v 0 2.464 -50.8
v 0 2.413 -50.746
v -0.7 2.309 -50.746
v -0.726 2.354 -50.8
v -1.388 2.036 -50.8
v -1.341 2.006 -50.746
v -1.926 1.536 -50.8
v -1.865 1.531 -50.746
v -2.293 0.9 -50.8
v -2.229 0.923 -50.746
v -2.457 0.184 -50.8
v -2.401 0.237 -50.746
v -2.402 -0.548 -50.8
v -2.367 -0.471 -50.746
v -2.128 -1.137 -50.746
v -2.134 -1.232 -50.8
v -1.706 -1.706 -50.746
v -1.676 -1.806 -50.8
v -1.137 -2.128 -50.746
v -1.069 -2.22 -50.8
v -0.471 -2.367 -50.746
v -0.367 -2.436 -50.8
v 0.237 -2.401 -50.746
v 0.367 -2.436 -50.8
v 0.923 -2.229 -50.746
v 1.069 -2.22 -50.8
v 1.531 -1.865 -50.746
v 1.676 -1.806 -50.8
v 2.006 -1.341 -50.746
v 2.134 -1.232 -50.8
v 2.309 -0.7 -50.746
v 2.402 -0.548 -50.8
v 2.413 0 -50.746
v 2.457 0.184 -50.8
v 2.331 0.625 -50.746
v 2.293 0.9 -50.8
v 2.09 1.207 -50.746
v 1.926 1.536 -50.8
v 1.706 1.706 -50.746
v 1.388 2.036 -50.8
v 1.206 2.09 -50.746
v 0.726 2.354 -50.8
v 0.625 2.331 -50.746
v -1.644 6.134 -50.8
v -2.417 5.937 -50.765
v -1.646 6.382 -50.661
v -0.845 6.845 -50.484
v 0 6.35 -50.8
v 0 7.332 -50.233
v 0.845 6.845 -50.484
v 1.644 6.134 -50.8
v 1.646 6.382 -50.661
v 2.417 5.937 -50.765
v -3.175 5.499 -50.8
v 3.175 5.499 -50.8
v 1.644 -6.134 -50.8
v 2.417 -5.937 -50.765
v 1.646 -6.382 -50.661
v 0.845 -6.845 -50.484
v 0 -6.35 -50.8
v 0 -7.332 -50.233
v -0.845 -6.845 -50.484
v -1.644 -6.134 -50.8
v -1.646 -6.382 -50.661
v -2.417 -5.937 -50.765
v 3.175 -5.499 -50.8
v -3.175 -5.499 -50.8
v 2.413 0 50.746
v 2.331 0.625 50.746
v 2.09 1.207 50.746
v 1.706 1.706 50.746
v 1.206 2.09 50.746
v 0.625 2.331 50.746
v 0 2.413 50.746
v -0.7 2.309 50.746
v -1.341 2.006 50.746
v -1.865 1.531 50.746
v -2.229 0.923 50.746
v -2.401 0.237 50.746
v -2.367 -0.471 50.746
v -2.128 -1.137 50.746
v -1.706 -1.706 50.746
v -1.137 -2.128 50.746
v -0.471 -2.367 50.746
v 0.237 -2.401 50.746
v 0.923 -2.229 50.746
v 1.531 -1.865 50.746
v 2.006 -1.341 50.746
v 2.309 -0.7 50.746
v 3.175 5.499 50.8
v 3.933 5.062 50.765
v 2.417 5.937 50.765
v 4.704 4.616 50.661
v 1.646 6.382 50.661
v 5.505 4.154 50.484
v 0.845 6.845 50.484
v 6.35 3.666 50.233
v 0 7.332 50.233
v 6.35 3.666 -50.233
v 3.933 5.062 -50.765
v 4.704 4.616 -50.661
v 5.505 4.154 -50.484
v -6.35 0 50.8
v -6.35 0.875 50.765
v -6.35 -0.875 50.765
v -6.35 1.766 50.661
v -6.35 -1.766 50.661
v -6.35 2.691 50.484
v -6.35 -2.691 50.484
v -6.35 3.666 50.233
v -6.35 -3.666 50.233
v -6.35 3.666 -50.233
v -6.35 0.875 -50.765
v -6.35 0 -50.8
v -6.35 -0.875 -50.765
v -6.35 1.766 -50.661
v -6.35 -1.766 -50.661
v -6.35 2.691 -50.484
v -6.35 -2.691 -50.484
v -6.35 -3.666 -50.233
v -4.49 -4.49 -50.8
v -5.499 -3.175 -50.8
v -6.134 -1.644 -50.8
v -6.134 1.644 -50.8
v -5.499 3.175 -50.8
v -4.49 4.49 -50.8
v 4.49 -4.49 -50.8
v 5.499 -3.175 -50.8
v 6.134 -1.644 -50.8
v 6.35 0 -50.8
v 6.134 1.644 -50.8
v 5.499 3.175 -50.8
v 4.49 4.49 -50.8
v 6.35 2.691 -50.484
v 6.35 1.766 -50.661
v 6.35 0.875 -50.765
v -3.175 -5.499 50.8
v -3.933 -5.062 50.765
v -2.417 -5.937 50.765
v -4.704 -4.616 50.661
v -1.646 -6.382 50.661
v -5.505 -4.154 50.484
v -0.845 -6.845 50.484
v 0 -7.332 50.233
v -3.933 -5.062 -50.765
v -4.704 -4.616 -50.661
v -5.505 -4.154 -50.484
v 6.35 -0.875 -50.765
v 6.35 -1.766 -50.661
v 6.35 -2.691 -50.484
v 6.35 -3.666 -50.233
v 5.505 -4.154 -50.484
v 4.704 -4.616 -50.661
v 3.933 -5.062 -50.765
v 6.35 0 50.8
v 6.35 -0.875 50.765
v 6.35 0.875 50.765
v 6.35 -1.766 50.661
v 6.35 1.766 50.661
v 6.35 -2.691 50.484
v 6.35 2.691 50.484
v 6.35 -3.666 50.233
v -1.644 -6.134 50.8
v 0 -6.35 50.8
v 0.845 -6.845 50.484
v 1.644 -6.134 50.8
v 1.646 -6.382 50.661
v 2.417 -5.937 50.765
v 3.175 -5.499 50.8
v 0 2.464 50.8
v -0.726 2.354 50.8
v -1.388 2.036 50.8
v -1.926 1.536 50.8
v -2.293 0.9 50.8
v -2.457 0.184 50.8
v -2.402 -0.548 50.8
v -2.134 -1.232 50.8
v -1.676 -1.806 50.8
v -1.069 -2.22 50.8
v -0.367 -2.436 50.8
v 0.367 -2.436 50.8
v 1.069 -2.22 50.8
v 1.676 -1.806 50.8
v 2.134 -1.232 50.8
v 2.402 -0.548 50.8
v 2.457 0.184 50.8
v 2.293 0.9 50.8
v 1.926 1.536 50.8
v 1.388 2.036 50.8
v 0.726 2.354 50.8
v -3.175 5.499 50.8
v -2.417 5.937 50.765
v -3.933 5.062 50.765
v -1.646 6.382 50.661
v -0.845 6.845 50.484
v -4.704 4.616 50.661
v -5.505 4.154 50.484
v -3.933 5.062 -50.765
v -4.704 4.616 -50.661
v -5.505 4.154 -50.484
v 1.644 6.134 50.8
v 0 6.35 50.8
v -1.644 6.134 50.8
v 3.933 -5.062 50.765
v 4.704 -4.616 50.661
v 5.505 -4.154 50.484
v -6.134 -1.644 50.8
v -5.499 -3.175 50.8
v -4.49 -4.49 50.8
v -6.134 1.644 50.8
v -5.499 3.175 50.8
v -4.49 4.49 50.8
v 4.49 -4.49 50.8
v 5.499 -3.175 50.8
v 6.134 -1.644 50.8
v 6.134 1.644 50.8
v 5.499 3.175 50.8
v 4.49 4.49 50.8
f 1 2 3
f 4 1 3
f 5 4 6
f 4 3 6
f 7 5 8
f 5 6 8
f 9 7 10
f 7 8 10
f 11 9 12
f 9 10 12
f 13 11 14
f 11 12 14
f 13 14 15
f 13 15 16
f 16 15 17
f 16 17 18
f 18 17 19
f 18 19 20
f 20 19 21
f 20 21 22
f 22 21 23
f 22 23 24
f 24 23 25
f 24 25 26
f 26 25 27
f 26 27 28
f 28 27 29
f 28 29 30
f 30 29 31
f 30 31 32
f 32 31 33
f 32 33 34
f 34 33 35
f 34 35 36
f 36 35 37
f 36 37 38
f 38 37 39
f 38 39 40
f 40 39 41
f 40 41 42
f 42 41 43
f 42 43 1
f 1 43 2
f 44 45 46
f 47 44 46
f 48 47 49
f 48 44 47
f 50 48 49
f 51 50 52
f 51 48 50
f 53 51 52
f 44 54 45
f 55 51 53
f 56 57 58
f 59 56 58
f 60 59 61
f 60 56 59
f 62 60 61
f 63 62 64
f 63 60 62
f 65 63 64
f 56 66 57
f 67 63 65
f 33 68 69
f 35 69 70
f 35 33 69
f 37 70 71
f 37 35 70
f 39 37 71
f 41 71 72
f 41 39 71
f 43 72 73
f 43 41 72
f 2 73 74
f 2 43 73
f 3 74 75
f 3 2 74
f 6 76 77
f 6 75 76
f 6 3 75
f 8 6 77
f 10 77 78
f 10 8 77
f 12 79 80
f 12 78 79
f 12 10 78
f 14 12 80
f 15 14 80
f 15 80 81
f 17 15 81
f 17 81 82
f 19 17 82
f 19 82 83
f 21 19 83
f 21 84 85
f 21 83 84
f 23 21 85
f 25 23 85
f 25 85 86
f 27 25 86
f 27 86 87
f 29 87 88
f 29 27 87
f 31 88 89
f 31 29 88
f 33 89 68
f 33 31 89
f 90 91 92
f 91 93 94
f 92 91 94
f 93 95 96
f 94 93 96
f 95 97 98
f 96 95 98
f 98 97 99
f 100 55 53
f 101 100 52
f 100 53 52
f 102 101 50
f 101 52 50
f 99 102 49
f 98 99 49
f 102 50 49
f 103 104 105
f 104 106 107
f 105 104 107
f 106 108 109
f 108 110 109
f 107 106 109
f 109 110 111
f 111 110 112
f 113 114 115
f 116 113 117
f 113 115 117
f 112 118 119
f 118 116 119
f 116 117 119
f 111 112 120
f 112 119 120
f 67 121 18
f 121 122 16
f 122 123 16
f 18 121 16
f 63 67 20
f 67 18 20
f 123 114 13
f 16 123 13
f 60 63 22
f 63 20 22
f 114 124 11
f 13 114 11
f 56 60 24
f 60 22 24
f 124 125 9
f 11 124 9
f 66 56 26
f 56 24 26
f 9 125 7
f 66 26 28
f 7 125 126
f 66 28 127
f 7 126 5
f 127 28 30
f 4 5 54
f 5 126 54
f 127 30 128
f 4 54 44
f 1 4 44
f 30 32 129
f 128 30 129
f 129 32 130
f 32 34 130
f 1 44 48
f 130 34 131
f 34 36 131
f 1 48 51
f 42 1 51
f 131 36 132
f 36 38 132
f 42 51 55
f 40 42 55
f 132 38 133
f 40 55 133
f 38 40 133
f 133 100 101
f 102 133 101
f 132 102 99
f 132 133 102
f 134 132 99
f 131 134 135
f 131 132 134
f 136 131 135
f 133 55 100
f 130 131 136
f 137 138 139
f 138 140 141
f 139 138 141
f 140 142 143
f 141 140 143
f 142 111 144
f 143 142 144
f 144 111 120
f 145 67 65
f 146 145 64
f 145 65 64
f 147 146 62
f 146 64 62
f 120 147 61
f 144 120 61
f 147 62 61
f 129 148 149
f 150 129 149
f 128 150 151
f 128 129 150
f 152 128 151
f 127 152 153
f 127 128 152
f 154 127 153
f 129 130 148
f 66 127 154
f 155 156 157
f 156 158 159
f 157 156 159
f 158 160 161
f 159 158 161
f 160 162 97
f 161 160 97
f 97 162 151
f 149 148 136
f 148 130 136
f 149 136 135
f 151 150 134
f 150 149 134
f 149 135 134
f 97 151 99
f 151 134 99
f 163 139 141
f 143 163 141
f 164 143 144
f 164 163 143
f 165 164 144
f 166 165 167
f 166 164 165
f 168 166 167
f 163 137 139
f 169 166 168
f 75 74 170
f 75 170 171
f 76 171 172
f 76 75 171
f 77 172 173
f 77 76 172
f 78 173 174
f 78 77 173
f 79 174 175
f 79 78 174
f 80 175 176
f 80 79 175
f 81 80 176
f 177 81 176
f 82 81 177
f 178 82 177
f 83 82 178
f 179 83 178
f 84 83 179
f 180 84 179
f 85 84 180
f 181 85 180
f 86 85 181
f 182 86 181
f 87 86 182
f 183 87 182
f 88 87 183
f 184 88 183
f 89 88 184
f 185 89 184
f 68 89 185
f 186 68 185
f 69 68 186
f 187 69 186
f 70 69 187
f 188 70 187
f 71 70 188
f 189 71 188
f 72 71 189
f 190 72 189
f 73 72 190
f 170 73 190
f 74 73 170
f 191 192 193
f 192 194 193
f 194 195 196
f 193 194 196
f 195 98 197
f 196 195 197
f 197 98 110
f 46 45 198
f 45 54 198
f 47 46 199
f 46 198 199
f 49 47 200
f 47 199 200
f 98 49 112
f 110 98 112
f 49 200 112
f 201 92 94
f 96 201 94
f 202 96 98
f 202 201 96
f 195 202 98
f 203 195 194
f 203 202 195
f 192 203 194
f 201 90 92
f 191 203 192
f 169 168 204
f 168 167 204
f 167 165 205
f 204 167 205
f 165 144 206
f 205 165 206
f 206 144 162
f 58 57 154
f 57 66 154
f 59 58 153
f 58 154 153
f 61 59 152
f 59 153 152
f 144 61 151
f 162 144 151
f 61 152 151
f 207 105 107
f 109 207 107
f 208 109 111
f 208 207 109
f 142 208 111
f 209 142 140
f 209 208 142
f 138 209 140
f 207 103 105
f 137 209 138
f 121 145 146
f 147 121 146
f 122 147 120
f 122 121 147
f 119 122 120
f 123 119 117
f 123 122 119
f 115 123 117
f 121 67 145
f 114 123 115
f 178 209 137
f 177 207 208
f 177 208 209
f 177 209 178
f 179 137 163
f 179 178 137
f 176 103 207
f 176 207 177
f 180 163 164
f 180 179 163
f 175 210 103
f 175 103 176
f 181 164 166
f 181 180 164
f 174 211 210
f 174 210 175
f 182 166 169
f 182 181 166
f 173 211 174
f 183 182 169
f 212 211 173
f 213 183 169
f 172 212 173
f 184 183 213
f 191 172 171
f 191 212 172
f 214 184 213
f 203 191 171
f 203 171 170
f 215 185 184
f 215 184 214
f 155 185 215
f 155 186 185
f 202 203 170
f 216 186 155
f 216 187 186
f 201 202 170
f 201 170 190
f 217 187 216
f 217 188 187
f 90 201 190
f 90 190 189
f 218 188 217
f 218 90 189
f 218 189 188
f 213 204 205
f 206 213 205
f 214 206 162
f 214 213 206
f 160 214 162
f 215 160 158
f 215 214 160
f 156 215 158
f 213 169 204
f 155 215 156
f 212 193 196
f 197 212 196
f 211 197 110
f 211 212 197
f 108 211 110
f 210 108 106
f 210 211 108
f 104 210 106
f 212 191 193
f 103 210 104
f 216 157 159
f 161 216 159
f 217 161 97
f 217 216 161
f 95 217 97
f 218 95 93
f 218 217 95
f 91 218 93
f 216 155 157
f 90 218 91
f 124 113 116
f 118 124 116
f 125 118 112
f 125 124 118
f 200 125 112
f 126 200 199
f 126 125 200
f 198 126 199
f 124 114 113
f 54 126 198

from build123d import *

# Parameters (mm, degrees)
EXTRUDE1_DEPTH          = 50.8
EXTRUDE1_DEPTH_BACK     = 50.8
SKETCH1_R               = 2.413
SKETCH8_OUTSIDE_W       = 392.404
SKETCH8_OUTSIDE_H       = 394.368
SKETCH8_OUTSIDE_R       = 6.35
EXTRUDE4_DEPTH          = 103.061970554
EXTRUDE4_DRAFT          = -60
MIRROR1_COPY_1_SKETCH_W = 392.404
MIRROR1_COPY_1_SKETCH_H = 394.368
MIRROR1_COPY_1_SKETCH_R = 6.35
MIRROR1_COPY_1_DEPTH    = 103.061970554
MIRROR1_COPY_1_DRAFT    = -60


with BuildPart() as part:
    # Sketch1 → Extrude1 (new, two sides: drawn at the far end of the back side and taken through both)
    with BuildSketch(Plane.XY.offset(-EXTRUDE1_DEPTH_BACK)):
        Polygon((0, 7.332348419), (-6.35, 3.666174209), (-6.35, -3.666174209), (0, -7.332348419), (6.35, -3.666174209), (6.35, 3.666174209), align=None)
        Circle(SKETCH1_R, mode=Mode.SUBTRACT)
    extrude(amount=EXTRUDE1_DEPTH + EXTRUDE1_DEPTH_BACK)

    # Extrude3 cone 1 section (through the dimple's axis) → Extrude3 (revolve, cut)
    with BuildSketch(Plane(origin=(0, 0, -50.8), x_dir=(0, 1, 0), z_dir=(1, 0, 0))):
        Polygon((0, 0), (2.4638, 0), (0, 2.642102028), align=None)
    extrude3 = revolve(axis=Axis((0, 0, -50.8), (0, 0, 1)), mode=Mode.SUBTRACT)


with BuildPart() as extrude4_tool:
    # Sketch8 outside → Extrude4 (with draft: the straight prism first)
    with BuildSketch(Plane(origin=(0, 0, -50.8), x_dir=(-1, 0, 0), z_dir=(0, 0, -1))):
        Rectangle(SKETCH8_OUTSIDE_W, SKETCH8_OUTSIDE_H)
        Circle(SKETCH8_OUTSIDE_R, mode=Mode.SUBTRACT)
    extrude(amount=-EXTRUDE4_DEPTH)
    # Extrude4: the draft: its side faces are tilted about the plane it starts from
    extrude4_sides = [extrude4_tool.faces().sort_by_distance(p)[0] for p in [
        (0, -197.184, 0.730985277),
        (-196.202, 0, 0.730985277),
        (0, 197.184, 0.730985277),
        (196.202, 0, 0.730985277),
        (6.35, 0, 0.730985277),
    ]]
    draft(extrude4_sides, Plane(origin=(0, 0, -50.8), x_dir=(-1, 0, 0), z_dir=(0, 0, -1)), EXTRUDE4_DRAFT)


with BuildPart() as part_1:
    add(part.part)

    # Extrude4: cut by extrude4_tool
    add(extrude4_tool.part, mode=Mode.SUBTRACT)

    # Mirror1: Extrude3 across plane
    add(extrude3.mirror(Plane.XY), mode=Mode.SUBTRACT)


with BuildPart() as mirror1_copy_1_tool:
    # Mirror1 copy 1 sketch → Mirror1 copy 1 (with draft: the straight prism first)
    with BuildSketch(Plane(origin=(0, 0, 50.8), x_dir=(-1, 0, 0), z_dir=(0, 0, 1))):
        Rectangle(MIRROR1_COPY_1_SKETCH_W, MIRROR1_COPY_1_SKETCH_H)
        Circle(MIRROR1_COPY_1_SKETCH_R, mode=Mode.SUBTRACT)
    extrude(amount=-MIRROR1_COPY_1_DEPTH)
    # Mirror1 copy 1: the draft: its side faces are tilted about the plane it starts from
    mirror1_copy_1_sides = [mirror1_copy_1_tool.faces().sort_by_distance(p)[0] for p in [
        (0, -197.184, -0.730985277),
        (-196.202, 0, -0.730985277),
        (0, 197.184, -0.730985277),
        (196.202, 0, -0.730985277),
        (6.35, 0, -0.730985277),
    ]]
    draft(mirror1_copy_1_sides, Plane(origin=(0, 0, 50.8), x_dir=(-1, 0, 0), z_dir=(0, 0, 1)), MIRROR1_COPY_1_DRAFT)


with BuildPart() as part_2:
    add(part_1.part)

    # Mirror1 copy 1: cut by mirror1_copy_1_tool
    add(mirror1_copy_1_tool.part, mode=Mode.SUBTRACT)


solid = part_2.part
